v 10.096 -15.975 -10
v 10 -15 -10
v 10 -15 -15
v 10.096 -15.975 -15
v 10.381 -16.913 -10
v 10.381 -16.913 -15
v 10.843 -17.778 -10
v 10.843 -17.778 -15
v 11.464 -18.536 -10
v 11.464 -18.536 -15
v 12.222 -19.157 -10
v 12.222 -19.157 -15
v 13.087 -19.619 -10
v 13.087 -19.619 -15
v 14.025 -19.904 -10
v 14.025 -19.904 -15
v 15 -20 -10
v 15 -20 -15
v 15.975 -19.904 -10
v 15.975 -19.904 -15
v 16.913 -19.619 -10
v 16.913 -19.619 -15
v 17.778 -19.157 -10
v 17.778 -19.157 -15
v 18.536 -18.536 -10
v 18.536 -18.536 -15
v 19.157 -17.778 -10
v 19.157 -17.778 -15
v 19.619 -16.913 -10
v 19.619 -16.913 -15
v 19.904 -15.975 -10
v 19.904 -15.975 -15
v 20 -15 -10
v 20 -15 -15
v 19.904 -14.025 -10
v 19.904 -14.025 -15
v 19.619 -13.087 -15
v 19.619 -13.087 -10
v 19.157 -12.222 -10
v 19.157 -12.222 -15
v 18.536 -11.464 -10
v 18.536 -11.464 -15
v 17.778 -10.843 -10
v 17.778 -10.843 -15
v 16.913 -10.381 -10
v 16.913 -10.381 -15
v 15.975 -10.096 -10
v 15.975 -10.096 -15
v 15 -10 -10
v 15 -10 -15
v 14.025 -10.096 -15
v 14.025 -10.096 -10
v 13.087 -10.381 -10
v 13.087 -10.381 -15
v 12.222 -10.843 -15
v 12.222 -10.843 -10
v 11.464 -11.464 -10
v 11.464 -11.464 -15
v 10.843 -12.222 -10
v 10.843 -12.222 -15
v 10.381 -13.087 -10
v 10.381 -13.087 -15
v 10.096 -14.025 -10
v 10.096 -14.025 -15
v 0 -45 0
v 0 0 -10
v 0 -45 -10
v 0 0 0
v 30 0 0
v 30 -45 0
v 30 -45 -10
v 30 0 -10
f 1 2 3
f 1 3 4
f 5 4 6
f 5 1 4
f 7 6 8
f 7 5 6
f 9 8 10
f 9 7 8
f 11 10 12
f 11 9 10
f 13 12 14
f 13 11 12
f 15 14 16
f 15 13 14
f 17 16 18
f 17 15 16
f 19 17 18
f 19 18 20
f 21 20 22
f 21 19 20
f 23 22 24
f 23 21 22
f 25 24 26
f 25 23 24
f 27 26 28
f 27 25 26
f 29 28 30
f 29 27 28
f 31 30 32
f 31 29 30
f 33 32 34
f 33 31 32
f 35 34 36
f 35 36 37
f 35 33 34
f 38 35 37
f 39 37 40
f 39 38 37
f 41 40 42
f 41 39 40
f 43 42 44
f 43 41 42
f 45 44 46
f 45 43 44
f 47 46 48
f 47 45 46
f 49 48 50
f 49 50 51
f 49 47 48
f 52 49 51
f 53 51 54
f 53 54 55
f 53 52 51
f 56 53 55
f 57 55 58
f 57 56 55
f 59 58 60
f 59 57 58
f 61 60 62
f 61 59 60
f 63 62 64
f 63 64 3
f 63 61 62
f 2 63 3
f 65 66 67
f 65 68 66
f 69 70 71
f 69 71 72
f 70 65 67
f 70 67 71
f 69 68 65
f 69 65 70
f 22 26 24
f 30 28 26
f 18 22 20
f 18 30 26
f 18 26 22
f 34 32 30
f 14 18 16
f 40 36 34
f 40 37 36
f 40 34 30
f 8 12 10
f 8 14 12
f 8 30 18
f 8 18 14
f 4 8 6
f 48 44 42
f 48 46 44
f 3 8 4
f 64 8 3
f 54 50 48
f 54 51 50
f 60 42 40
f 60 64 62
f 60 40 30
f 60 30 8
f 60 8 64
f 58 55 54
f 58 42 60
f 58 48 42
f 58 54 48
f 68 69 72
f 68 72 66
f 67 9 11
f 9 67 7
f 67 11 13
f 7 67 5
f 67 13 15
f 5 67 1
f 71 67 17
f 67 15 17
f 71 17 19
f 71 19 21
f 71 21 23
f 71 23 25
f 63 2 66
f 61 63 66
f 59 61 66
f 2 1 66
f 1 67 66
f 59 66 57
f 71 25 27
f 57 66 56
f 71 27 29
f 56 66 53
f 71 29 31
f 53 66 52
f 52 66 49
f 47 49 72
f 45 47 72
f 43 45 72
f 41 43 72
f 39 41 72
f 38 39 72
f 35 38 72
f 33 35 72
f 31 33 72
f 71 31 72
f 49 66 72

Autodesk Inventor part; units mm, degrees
ref_plane "YZ Plane" through (0, 0, 0) normal (1, 0, 0) x (0, 1, 0)
ref_plane "XZ Plane" through (0, 0, 0) normal (0, 1, 0) x (-1, 0, 0)
ref_plane "XY Plane" through (0, 0, 0) normal (0, 0, 1) x (1, 0, 0)
sketch "Sketch1" plane through (0, 0, 0) normal (0, 0, 1) x (1, 0, 0)
  line L0 (0, 0) -> (0, -45)
  line L1 (0, -45) -> (30, -45)
  line L2 (30, -45) -> (30, 0)
  line L3 (30, 0) -> (0, 0)
  dimension "d0" = 45
  dimension "d1" = 30
extrude "Extrusion1" add sketch "Sketch1" against normal blind 10
sketch "Sketch2" plane through (0, 0, -10) normal (0, 0, -1) x (-1, 0, 0)
  line L0 (0, 0) -> (-30, 0) projected
  line L1 (-15, 0) -> (-15, -45)
  line L2 (-30, -45) -> (0, -45) projected
  line L3 (0, -45) -> (0, 0) projected
  line L4 (0, -22.5) -> (-30, -22.5)
  line L5 (-30, 0) -> (-30, -45) projected
  circle A0 centre (-15, -15) radius 5
  dimension "d4" = 10
  dimension "d5" = 15
extrude "Extrusion2" add sketch "Sketch2" along normal blind 5 contours A0 L1 | L1 A0
ref_plane "Work Plane1" through (0, -15, 0) normal (0, 1, 0) x (1, 0, 0)
properties part number "esp32CAM"
